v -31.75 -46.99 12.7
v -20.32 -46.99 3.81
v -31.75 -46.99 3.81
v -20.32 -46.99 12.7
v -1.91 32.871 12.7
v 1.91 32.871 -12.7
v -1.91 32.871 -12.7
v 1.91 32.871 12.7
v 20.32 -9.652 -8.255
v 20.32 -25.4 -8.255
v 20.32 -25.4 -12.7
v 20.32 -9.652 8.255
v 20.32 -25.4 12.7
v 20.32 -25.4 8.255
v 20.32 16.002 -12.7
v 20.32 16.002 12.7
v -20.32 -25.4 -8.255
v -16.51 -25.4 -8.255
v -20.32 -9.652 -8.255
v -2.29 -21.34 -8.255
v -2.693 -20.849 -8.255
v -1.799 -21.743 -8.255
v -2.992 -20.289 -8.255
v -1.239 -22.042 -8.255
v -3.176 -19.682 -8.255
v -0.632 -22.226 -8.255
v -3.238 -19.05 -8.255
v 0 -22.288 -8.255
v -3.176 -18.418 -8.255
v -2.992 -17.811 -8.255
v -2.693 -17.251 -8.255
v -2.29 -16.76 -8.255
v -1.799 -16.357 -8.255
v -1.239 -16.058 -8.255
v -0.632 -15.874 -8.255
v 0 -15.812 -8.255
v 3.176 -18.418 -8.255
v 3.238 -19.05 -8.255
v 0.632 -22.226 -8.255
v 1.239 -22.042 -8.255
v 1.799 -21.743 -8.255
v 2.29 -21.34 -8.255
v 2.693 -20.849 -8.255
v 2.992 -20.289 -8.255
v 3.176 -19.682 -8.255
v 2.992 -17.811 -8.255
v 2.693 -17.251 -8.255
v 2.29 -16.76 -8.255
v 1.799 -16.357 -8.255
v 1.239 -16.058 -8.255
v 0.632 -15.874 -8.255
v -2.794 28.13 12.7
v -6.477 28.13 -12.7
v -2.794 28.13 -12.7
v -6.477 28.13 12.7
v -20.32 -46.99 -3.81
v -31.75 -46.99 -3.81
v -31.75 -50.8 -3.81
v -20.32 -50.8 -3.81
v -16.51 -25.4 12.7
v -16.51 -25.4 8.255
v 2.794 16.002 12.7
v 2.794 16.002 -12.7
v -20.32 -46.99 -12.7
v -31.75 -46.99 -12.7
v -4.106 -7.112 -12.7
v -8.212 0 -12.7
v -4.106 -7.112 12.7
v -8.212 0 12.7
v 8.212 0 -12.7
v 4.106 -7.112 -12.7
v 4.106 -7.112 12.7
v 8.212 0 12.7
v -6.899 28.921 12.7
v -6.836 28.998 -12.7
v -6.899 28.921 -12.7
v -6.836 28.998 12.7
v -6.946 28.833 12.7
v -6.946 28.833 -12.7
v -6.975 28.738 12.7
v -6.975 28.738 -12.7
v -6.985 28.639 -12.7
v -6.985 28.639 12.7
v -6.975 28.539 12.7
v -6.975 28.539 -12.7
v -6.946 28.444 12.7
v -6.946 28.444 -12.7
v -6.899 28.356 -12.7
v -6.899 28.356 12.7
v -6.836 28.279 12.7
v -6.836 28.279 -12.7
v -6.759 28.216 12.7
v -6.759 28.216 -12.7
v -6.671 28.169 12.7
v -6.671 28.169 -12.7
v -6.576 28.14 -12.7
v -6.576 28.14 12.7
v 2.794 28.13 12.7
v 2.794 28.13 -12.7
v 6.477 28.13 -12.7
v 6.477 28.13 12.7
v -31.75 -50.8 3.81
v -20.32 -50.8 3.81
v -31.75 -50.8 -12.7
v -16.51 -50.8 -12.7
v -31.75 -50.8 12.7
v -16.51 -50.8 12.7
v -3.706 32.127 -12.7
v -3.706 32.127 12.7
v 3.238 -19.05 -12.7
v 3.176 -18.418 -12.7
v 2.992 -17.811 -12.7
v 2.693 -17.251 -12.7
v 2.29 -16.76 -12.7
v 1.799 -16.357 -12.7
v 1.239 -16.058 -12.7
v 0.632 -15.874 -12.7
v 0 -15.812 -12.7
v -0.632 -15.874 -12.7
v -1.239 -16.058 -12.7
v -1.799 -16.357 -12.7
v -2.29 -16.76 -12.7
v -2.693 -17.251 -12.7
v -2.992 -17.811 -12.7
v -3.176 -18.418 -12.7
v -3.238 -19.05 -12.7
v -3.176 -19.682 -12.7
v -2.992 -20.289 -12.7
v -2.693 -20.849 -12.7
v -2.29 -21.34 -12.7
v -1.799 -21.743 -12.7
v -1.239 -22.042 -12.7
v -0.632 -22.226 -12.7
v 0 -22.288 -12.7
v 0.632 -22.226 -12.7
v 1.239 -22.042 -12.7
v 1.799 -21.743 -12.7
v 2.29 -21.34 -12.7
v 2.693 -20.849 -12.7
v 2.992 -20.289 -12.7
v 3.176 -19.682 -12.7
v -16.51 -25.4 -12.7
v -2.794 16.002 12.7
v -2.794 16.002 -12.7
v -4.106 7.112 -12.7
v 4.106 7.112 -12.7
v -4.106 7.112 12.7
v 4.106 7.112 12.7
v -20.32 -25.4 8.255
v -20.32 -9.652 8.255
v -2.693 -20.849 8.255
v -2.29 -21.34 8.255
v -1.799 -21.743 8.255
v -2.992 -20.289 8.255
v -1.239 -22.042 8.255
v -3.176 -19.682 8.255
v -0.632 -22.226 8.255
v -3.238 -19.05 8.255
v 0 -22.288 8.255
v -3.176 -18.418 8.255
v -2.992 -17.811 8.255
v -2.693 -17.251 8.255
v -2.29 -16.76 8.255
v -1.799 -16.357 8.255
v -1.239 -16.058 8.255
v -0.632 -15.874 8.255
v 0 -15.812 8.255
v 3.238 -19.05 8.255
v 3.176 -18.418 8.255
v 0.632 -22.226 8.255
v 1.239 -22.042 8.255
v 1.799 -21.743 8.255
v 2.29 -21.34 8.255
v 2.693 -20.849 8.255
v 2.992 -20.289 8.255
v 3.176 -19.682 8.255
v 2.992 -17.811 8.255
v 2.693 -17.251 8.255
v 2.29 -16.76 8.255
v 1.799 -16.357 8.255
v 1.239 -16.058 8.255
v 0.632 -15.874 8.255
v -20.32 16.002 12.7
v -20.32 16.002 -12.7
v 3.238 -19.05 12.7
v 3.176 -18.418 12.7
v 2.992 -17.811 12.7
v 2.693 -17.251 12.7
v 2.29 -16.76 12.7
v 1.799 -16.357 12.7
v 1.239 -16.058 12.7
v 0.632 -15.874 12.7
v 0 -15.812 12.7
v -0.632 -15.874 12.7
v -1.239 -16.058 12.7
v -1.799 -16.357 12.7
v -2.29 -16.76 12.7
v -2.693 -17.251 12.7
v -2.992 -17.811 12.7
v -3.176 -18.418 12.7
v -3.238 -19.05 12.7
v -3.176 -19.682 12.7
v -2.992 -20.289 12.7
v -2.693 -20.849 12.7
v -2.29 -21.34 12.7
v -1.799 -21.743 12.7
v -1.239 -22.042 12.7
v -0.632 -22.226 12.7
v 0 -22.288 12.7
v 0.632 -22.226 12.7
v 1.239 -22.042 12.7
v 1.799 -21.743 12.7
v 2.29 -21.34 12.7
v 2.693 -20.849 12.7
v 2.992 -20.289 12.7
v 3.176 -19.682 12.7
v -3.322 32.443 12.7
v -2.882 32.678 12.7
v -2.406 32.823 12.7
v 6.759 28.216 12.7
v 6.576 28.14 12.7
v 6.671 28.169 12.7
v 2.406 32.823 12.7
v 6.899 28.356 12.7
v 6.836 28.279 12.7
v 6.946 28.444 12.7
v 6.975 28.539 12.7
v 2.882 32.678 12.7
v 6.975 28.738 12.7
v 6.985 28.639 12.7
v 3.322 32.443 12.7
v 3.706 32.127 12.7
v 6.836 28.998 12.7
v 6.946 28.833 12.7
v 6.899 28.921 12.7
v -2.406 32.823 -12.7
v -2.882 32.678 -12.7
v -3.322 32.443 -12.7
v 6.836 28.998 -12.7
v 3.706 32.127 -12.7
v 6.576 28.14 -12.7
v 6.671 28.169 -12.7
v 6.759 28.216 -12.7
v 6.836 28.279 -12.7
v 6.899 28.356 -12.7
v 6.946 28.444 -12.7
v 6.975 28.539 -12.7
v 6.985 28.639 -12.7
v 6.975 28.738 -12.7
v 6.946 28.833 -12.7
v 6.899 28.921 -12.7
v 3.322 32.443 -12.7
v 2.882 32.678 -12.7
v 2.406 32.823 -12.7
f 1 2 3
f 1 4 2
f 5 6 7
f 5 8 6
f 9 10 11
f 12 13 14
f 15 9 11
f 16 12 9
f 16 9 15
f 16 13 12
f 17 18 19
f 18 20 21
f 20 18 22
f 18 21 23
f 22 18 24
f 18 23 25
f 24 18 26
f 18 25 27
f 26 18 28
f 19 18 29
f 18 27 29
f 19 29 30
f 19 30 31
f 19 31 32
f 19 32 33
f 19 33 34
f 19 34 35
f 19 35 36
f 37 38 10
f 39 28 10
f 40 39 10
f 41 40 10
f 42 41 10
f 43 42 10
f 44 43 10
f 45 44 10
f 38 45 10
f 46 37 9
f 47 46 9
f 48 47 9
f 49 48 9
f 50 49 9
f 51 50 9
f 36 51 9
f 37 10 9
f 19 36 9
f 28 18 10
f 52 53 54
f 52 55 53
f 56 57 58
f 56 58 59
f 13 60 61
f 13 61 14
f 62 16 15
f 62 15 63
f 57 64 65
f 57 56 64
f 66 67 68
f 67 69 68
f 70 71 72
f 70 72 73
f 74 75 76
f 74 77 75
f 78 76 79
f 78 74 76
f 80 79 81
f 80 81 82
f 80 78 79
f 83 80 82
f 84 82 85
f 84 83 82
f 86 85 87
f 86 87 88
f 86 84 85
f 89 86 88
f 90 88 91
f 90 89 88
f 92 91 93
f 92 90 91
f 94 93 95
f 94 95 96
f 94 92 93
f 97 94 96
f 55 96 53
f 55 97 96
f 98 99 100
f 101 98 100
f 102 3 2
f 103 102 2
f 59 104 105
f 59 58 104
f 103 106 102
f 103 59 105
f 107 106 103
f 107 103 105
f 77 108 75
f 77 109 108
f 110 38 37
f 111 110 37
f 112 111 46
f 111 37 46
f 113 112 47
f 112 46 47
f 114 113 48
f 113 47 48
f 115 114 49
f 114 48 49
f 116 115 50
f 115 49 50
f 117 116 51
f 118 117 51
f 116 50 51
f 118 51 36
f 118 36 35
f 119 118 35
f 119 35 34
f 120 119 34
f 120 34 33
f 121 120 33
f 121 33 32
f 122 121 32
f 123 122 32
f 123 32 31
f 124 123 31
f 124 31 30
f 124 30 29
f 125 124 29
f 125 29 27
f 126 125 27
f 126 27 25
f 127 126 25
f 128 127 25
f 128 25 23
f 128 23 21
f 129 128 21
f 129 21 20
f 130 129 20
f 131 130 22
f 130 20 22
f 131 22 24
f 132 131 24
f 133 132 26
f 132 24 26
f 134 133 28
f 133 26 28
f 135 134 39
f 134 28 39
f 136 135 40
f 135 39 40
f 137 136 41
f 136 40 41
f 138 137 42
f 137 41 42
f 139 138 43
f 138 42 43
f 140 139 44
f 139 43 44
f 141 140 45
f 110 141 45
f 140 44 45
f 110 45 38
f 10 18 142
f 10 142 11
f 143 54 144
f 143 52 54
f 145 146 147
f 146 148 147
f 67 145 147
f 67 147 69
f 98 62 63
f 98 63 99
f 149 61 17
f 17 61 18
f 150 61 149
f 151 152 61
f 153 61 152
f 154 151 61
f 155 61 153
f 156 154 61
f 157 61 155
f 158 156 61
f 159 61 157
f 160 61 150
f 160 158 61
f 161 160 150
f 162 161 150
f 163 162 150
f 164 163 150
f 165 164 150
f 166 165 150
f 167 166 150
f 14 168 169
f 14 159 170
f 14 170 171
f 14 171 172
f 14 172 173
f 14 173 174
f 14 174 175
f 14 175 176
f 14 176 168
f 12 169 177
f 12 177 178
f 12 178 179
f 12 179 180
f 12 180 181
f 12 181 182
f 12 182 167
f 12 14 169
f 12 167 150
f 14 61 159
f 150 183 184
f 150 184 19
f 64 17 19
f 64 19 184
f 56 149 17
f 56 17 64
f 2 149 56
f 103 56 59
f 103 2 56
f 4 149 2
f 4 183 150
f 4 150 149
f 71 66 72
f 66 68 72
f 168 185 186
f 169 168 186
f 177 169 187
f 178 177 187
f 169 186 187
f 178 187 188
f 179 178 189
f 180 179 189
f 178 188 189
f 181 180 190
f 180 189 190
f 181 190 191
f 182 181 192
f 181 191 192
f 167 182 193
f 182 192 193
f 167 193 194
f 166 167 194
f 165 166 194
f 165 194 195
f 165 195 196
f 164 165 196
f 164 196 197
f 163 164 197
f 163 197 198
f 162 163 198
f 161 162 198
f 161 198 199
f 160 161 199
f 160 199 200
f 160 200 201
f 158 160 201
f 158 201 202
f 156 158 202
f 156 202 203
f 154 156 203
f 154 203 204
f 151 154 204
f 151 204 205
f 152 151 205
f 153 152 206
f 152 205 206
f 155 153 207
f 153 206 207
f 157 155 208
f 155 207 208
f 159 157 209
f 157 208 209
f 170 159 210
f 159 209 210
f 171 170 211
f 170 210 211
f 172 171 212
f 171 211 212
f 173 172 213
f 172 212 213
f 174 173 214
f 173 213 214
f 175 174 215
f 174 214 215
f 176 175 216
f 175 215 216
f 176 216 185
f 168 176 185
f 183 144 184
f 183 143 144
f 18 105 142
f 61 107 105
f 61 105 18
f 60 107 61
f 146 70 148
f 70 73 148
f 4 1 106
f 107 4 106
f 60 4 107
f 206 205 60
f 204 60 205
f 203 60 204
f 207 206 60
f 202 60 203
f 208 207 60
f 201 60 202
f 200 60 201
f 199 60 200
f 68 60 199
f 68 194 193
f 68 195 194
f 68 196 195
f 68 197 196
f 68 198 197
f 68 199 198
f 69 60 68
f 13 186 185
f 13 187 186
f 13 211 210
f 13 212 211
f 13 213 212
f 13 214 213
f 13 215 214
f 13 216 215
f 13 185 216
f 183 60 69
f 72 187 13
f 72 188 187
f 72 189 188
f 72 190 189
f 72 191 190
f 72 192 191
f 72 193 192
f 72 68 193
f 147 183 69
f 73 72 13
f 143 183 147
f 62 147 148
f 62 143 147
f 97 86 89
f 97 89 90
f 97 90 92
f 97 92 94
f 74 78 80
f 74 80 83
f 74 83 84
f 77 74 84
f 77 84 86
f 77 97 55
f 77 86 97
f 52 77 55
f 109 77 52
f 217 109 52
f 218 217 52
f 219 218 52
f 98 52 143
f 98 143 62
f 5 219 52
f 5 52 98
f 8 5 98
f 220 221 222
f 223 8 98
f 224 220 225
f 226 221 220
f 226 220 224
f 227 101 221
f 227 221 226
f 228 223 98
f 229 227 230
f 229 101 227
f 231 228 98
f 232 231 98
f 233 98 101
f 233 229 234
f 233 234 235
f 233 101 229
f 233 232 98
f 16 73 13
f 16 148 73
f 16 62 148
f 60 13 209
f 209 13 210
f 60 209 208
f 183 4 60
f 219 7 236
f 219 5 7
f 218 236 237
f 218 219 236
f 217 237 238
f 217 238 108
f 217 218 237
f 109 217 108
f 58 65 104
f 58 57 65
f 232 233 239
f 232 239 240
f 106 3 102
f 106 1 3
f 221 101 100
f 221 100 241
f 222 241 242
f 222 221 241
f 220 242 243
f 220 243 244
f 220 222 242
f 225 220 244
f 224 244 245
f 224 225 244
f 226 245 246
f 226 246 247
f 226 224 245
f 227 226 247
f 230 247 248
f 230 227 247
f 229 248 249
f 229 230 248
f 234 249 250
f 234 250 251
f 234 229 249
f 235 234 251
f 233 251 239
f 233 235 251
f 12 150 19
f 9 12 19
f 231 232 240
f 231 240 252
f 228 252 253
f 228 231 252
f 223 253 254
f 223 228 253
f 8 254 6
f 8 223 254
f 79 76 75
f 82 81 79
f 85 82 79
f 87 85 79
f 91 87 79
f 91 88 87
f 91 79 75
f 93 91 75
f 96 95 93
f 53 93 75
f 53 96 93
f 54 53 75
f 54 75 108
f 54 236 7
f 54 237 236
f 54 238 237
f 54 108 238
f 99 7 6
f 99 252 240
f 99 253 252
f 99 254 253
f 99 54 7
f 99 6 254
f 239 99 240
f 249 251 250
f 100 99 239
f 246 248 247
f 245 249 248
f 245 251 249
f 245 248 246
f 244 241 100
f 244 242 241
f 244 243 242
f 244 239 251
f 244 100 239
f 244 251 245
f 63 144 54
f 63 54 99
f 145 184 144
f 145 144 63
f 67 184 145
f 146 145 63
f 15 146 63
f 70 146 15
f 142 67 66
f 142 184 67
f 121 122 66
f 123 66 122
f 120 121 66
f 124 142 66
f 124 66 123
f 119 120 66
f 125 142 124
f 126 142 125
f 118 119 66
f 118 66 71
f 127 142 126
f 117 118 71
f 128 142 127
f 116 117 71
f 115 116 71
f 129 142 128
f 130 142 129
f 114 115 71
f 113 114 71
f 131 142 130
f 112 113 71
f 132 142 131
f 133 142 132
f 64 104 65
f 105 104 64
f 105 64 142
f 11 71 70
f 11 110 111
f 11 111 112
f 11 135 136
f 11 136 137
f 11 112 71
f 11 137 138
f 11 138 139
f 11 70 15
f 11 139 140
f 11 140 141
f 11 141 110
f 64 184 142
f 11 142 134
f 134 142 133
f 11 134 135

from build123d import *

# Parameters (mm, degrees)
BOSS_EXTRUDE1_DEPTH             = 12.7
BOSS_EXTRUDE4_REACH             = 14.7
BOSS_EXTRUDE4_DIRECTION_2_REACH = 14.7
SKETCH6_W                       = 16.51
SKETCH6_H                       = 15.748
CUT_EXTRUDE2_DEPTH              = 53.07
SKETCH11_W                      = 11.43
SKETCH11_H                      = 7.62
CUT_EXTRUDE3_DEPTH              = 3.81
SKETCH15_R                      = 3.2385
CUT_EXTRUDE4_DEPTH              = 25.4


with BuildPart() as part:
    # Sketch1 → Boss-Extrude1 (new body, symmetric)
    with BuildSketch(Plane.XY):
        with BuildLine():
            Line((-20.32, 16.002), (-20.32, -25.4))
            Line((-20.32, -25.4), (20.32, -25.4))
            Line((20.32, -25.4), (20.32, 16.002))
            Line((20.32, 16.002), (2.794, 16.002))
            Line((2.794, 16.002), (2.794, 28.1305))
            Line((2.794, 28.1305), (6.477, 28.1305))
            ThreePointArc((6.477, 28.1305), (6.946330803, 28.444096816), (6.836210245, 28.997710245))
            Line((6.836210245, 28.997710245), (3.706459265, 32.127461224))
            ThreePointArc((3.706459265, 32.127461224), (2.882423959, 32.678064013), (1.910408041, 32.87141))
            Line((1.910408041, 32.87141), (-1.910408041, 32.87141))
            ThreePointArc((-1.910408041, 32.87141), (-2.882423959, 32.678064013), (-3.706459265, 32.127461224))
            Line((-3.706459265, 32.127461224), (-6.836210245, 28.997710245))
            ThreePointArc((-6.836210245, 28.997710245), (-6.946330803, 28.444096816), (-6.477, 28.1305))
            Line((-6.477, 28.1305), (-2.794, 28.1305))
            Line((-2.794, 28.1305), (-2.794, 16.002))
            Line((-2.794, 16.002), (-20.32, 16.002))
        make_face()
        Polygon((-4.106115114, 7.112), (-8.212230229, 0), (-4.106115114, -7.112), (4.106115114, -7.112), (8.212230229, 0), (4.106115114, 7.112), align=None, mode=Mode.SUBTRACT)
    extrude(amount=BOSS_EXTRUDE1_DEPTH, both=True)

    # Boss-Extrude4: up to this face of the body (flat: up to its plane)
    boss_extrude4_end = Plane(part.part.faces().sort_by_distance((-6.289975232, 28.715968196, 12.7))[0])
    # Sketch10 → Boss-Extrude4 (add, up to the picked face)
    with BuildSketch(Plane.XY, mode=Mode.PRIVATE) as boss_extrude4_sk1:
        Polygon((-20.32, -25.4), (-20.32, -46.99), (-31.75, -46.99), (-31.75, -50.8), (-16.51, -50.8), (-16.51, -25.4), align=None)
    boss_extrude4_tool1 = split(extrude(boss_extrude4_sk1.sketch, amount=BOSS_EXTRUDE4_REACH, mode=Mode.PRIVATE), bisect_by=boss_extrude4_end, keep=Keep.BOTH, mode=Mode.PRIVATE)
    add(boss_extrude4_tool1.solids().sort_by_distance((-20.023788, -36.195, 0))[0])

    # Boss-Extrude4 direction 2: up to this face of the body (flat: up to its plane)
    boss_extrude4_direction_2_end = Plane(part.part.faces().sort_by_distance((-6.289975232, 28.715968196, -12.7))[0])
    # Sketch10 → Boss-Extrude4 direction 2 (add, up to the picked face)
    with BuildSketch(Plane.XY, mode=Mode.PRIVATE) as boss_extrude4_direction_2_sk1:
        Polygon((-20.32, -25.4), (-20.32, -46.99), (-31.75, -46.99), (-31.75, -50.8), (-16.51, -50.8), (-16.51, -25.4), align=None)
    boss_extrude4_direction_2_tool1 = split(extrude(boss_extrude4_direction_2_sk1.sketch, amount=-BOSS_EXTRUDE4_DIRECTION_2_REACH, mode=Mode.PRIVATE), bisect_by=boss_extrude4_direction_2_end, keep=Keep.BOTH, mode=Mode.PRIVATE)
    add(boss_extrude4_direction_2_tool1.solids().sort_by_distance((-20.023788, -36.195, 0))[0])

    # Sketch6 → Cut-Extrude2 (cut, through all)
    with BuildSketch(Plane(origin=(20.32, 0, 0), x_dir=(0, 0, -1), z_dir=(1, 0, 0))):
        with Locations((0, -17.526)):
            Rectangle(SKETCH6_W, SKETCH6_H)
    extrude(amount=-CUT_EXTRUDE2_DEPTH, mode=Mode.SUBTRACT)

    # Sketch11 → Cut-Extrude3 (cut)
    with BuildSketch(Plane(origin=(0, -46.99, 0), x_dir=(1, 0, 0), z_dir=(0, 1, 0))):
        with Locations((-26.035, 0)):
            Rectangle(SKETCH11_W, SKETCH11_H)
    extrude(amount=-CUT_EXTRUDE3_DEPTH, mode=Mode.SUBTRACT)

    # Sketch15 → Cut-Extrude4 (cut)
    with BuildSketch(Plane.XY.offset(12.7)):
        with Locations((0, -19.05)):
            Circle(SKETCH15_R)
    extrude(amount=-CUT_EXTRUDE4_DEPTH, mode=Mode.SUBTRACT)


solid = part.part
